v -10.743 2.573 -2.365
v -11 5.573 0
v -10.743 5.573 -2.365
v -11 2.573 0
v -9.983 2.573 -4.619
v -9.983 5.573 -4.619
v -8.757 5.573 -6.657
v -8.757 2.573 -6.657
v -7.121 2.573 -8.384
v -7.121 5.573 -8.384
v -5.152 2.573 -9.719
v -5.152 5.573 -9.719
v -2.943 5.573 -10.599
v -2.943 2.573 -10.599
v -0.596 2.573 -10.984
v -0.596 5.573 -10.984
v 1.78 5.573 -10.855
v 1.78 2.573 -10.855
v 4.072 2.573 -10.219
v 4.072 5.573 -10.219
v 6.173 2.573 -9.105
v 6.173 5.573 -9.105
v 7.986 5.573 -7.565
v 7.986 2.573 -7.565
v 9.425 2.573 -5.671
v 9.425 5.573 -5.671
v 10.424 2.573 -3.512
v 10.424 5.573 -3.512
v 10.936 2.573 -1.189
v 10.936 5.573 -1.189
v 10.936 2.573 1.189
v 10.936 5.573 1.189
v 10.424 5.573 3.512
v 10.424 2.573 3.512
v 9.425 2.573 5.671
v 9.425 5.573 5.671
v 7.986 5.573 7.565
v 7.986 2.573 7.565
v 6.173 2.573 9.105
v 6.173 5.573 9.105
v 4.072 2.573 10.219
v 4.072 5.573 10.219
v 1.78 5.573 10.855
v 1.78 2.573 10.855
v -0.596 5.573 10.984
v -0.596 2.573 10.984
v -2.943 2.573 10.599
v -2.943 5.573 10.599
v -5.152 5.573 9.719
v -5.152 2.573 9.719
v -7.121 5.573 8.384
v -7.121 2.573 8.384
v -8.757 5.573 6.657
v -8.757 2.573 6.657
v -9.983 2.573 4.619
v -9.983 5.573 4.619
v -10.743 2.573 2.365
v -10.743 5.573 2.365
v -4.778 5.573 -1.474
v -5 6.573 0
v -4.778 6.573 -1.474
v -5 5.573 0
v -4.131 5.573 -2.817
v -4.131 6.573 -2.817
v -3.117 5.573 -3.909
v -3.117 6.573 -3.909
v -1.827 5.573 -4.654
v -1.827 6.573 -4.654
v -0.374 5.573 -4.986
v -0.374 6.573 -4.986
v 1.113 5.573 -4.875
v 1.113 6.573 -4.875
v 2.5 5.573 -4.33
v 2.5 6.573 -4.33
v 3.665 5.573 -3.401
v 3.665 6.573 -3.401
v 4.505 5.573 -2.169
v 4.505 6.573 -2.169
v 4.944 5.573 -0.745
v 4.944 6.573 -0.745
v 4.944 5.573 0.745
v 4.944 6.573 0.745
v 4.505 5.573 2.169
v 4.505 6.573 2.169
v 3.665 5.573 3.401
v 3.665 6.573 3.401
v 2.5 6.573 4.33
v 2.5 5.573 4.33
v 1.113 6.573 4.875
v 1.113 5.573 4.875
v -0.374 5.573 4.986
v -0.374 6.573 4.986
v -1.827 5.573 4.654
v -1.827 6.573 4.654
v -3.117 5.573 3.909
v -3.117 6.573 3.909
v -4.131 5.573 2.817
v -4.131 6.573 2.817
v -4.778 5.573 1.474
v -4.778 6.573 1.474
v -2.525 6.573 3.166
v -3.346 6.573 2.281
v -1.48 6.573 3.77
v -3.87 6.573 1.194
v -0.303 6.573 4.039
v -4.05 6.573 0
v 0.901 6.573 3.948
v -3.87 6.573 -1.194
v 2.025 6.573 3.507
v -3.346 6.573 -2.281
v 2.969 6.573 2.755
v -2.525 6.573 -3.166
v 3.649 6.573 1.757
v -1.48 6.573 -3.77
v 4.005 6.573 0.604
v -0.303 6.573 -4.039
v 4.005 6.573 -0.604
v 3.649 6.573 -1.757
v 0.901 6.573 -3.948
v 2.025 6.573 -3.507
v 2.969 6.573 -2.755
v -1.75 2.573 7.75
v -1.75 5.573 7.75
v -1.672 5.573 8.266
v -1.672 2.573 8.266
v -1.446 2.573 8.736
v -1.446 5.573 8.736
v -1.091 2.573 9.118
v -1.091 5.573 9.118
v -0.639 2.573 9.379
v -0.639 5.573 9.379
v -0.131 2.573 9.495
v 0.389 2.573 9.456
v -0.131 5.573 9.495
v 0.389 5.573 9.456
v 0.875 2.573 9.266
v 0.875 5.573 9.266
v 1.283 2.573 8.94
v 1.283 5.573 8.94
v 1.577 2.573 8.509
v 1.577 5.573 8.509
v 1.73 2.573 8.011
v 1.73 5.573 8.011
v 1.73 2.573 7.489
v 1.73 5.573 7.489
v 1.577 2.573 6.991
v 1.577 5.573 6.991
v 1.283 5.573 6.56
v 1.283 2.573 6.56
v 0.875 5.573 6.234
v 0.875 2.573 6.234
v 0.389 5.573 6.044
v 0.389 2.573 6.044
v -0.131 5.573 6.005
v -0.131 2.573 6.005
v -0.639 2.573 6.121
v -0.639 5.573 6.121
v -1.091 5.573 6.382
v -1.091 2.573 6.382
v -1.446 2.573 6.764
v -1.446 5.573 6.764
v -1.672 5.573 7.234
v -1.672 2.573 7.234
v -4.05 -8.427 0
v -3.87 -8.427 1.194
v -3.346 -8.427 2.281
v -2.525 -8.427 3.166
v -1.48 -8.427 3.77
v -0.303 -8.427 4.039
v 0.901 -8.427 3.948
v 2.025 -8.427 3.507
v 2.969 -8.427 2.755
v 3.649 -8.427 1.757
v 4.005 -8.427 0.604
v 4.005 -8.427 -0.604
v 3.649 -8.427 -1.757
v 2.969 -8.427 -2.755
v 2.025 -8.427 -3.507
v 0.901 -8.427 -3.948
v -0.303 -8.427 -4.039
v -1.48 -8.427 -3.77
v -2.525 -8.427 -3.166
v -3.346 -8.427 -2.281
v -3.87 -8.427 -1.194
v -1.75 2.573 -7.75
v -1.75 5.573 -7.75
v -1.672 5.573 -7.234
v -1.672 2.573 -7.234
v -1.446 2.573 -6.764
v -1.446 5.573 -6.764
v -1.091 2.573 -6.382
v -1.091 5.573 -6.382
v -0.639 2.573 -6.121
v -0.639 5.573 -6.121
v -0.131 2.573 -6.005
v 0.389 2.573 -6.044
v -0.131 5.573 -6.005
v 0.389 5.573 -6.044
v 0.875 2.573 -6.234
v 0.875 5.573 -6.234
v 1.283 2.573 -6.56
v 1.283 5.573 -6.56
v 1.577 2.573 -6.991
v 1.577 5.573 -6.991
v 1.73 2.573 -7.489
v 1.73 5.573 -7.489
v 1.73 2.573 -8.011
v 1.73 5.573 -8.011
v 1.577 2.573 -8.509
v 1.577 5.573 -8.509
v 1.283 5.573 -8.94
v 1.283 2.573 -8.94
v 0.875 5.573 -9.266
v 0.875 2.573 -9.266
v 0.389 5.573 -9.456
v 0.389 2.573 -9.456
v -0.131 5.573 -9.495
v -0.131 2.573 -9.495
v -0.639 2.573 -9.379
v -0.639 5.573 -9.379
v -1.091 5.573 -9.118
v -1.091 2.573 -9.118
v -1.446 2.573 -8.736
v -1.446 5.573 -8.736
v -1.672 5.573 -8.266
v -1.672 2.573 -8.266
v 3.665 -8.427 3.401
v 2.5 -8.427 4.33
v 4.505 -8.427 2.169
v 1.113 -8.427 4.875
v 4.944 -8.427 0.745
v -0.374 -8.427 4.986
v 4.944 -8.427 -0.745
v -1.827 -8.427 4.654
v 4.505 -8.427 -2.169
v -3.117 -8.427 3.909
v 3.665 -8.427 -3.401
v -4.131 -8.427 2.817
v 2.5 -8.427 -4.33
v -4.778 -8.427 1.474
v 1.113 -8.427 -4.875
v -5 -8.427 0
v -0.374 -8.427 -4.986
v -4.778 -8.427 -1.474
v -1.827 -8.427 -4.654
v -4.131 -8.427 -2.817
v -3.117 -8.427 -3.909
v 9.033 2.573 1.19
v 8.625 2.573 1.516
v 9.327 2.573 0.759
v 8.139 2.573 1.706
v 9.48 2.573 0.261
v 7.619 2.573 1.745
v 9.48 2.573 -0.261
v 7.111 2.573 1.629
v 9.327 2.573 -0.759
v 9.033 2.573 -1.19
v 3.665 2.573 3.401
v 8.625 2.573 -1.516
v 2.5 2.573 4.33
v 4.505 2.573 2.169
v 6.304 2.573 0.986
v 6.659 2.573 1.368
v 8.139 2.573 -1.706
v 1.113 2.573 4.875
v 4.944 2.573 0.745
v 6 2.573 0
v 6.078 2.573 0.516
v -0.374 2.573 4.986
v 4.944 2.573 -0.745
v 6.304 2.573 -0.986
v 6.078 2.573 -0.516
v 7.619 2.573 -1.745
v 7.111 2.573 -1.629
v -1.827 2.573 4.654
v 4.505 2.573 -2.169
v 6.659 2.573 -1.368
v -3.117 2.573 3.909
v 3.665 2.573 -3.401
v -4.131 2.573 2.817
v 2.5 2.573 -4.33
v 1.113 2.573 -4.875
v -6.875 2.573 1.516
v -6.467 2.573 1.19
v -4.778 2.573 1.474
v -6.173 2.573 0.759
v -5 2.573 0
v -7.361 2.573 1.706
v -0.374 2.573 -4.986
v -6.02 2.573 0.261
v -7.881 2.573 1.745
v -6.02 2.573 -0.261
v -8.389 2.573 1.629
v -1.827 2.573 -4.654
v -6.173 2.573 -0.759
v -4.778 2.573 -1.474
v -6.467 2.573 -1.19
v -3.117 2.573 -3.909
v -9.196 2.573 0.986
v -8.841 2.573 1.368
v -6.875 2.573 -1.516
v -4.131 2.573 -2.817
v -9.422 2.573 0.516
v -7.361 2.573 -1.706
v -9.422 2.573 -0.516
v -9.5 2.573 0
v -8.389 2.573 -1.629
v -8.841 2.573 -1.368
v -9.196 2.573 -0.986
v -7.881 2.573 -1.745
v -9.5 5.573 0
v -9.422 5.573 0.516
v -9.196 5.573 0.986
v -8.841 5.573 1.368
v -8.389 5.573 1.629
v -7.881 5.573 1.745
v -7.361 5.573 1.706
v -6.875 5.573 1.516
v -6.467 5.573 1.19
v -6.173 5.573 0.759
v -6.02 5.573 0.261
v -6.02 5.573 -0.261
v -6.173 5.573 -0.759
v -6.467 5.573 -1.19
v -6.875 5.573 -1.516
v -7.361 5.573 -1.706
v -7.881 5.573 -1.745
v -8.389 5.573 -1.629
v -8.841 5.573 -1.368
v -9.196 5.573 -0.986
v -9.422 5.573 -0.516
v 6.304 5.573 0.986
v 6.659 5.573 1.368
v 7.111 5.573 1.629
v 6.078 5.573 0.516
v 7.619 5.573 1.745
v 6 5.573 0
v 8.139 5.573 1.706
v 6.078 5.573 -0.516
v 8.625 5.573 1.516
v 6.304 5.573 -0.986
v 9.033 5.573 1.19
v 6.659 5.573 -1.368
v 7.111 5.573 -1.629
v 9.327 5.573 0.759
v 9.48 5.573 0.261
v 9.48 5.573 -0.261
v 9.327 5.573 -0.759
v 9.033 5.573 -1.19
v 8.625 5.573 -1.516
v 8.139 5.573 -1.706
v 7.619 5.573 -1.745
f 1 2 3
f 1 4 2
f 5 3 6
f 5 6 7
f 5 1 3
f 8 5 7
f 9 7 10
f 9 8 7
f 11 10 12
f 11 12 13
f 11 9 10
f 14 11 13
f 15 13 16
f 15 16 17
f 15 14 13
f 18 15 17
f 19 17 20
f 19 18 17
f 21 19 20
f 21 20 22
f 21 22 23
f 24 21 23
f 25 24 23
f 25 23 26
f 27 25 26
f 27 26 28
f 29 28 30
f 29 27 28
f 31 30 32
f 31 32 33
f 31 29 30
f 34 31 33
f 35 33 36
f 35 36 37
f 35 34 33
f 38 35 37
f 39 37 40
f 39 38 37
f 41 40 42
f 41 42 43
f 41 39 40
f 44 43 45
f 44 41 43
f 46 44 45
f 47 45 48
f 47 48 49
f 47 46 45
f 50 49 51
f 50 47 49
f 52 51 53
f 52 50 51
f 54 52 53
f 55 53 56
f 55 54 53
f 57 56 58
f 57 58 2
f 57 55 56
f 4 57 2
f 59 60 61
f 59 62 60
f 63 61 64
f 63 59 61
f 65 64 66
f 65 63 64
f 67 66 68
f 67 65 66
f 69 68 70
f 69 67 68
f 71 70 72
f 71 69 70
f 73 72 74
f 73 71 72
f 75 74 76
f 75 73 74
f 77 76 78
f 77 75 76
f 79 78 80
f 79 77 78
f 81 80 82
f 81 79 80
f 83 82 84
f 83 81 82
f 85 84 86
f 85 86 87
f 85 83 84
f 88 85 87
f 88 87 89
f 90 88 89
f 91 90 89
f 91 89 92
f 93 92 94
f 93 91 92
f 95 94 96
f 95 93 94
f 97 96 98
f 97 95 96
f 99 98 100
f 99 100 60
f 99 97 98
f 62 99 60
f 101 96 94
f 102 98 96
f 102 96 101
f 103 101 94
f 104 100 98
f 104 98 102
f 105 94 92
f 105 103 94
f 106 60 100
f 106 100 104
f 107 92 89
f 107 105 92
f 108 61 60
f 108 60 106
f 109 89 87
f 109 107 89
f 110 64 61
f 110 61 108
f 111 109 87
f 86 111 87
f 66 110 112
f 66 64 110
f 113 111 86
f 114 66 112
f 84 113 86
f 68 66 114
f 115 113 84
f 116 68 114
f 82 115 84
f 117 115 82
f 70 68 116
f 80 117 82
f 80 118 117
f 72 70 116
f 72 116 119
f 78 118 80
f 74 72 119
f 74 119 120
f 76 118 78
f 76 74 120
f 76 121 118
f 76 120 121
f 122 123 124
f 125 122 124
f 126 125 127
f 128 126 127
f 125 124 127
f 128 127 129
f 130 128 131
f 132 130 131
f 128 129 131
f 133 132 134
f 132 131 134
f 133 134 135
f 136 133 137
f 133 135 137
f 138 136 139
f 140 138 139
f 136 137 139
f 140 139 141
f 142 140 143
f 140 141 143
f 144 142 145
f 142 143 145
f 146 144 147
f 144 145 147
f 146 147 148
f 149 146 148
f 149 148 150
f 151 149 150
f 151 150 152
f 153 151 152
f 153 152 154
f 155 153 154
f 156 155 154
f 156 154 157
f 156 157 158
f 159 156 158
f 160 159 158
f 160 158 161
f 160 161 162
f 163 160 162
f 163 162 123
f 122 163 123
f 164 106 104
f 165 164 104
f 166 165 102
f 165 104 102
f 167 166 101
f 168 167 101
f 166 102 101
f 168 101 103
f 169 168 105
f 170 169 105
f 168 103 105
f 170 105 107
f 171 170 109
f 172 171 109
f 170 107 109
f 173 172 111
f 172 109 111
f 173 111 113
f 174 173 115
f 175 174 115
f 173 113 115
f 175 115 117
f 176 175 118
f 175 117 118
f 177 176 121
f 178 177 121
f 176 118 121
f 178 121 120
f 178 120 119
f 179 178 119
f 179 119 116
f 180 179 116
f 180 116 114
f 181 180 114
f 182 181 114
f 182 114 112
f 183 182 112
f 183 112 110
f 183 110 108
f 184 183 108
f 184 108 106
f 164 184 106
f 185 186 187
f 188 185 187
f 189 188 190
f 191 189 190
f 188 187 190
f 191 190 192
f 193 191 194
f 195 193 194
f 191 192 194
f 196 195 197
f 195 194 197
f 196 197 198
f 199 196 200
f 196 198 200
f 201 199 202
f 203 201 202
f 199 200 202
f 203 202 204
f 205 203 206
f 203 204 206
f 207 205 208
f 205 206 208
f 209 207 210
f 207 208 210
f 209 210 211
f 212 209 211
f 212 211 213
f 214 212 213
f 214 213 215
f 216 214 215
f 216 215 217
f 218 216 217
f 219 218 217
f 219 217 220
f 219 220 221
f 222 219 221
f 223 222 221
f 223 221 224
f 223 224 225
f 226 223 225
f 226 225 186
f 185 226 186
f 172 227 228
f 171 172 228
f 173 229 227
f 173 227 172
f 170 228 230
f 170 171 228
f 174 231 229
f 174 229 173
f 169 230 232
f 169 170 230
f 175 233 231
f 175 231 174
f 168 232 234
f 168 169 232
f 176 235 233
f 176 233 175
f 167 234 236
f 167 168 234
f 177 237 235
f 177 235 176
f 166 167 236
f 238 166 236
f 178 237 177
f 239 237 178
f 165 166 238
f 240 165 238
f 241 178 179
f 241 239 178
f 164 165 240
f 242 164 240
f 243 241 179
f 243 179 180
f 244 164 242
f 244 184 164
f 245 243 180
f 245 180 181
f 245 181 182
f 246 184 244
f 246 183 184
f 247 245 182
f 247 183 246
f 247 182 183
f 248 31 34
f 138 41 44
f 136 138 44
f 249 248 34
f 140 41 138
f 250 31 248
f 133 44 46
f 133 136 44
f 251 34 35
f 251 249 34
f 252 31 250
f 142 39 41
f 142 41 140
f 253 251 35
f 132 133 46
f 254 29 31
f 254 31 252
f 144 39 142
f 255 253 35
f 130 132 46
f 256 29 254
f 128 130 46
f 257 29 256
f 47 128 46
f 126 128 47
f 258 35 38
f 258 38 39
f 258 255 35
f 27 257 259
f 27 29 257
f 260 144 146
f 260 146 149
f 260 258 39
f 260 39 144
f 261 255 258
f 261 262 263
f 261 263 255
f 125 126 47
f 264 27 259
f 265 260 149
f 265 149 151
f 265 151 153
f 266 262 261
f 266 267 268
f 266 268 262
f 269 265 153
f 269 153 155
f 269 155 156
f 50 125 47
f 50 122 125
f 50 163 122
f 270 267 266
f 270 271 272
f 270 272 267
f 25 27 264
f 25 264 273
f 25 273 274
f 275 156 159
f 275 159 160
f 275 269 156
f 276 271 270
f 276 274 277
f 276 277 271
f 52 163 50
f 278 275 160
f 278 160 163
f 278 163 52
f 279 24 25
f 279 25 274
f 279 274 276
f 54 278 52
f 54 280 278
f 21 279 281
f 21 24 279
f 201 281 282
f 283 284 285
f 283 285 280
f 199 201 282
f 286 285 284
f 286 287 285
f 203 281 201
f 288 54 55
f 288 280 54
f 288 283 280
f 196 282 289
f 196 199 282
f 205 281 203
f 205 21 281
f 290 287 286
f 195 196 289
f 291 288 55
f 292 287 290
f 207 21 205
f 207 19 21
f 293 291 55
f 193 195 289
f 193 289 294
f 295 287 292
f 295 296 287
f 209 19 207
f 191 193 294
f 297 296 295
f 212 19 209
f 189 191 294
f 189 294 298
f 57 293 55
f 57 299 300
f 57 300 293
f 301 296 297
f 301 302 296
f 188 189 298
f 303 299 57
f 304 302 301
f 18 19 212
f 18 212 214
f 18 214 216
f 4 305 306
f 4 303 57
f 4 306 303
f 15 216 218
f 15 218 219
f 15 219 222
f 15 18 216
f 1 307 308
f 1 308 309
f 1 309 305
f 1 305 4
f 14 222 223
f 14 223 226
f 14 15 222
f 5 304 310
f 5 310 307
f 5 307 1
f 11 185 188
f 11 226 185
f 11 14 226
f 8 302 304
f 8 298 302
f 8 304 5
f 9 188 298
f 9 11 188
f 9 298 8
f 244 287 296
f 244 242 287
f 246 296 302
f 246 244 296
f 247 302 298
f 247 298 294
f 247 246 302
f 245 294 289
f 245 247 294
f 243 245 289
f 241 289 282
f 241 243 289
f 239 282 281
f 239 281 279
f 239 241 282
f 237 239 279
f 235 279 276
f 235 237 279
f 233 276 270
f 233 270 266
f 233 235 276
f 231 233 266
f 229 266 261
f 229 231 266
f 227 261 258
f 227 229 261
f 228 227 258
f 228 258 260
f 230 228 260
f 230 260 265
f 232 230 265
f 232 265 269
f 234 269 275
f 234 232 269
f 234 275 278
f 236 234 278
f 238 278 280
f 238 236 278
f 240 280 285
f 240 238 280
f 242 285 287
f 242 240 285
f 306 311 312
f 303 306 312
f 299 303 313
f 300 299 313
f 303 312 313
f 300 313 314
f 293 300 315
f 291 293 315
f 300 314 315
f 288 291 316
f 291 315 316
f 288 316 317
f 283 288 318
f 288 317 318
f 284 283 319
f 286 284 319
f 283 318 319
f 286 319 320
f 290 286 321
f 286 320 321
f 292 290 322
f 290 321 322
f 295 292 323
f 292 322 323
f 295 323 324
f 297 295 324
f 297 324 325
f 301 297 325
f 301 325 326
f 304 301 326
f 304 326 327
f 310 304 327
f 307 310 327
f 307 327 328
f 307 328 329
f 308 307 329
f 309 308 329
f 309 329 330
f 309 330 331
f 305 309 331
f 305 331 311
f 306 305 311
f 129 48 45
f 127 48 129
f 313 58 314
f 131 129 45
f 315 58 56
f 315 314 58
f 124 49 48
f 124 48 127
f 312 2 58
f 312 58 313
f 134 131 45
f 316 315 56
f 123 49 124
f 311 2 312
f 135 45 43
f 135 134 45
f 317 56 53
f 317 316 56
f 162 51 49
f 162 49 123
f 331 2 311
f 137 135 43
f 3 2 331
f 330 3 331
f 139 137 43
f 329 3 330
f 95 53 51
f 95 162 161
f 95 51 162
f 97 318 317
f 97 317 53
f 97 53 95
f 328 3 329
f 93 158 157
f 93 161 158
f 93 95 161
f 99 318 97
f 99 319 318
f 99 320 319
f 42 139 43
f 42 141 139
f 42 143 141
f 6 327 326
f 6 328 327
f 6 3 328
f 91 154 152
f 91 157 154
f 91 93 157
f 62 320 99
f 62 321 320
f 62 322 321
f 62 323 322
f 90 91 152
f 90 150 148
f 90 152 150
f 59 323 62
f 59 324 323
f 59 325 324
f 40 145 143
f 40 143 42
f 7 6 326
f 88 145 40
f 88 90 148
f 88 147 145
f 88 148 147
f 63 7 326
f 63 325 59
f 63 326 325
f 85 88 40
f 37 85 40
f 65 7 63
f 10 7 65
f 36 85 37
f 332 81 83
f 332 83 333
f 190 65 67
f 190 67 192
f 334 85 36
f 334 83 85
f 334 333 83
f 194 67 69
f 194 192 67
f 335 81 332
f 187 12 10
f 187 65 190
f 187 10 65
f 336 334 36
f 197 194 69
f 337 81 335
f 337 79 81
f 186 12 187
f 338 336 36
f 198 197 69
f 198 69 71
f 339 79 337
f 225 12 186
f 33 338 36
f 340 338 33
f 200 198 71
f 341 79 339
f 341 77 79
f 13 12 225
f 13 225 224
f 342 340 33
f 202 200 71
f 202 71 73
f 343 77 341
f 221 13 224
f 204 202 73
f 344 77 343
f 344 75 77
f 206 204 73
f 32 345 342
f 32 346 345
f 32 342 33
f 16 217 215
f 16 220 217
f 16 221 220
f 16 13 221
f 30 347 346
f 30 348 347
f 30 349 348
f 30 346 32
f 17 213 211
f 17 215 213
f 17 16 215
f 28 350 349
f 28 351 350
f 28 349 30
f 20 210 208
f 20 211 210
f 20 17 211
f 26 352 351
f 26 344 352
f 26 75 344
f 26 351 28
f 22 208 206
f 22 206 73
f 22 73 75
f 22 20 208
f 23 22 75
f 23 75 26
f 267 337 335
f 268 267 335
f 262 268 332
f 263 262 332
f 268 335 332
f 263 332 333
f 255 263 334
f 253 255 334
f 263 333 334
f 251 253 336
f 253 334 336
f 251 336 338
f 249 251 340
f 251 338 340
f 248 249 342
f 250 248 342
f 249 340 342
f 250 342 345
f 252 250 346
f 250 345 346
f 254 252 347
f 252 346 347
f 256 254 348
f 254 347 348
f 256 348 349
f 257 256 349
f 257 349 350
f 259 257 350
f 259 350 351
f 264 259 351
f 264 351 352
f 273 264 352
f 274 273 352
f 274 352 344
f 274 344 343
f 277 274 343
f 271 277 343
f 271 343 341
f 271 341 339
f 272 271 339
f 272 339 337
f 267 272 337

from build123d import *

# Parameters (mm, degrees)
KES_EKSTR_ZYON1_REACH = 23.61
IZIM2_R               = 4.05
KES_EKSTR_ZYON2_REACH = 22.928
IZIM3_R               = 1.75


with BuildPart() as part:
    # Çizim1 → Döndür1 (revolve)
    with BuildSketch(Plane.XY, mode=Mode.PRIVATE) as d_nd_r1_sk:
        Polygon((0, 6.572949203), (5, 6.572949203), (5, 5.572949203), (11, 5.572949203), (11, 2.572949203), (5, 2.572949203), (5, -8.427050797), (0, -8.427050797), align=None)
    revolve(d_nd_r1_sk.sketch.rotate(Axis((0, 6.572949203, 0), (0, -1, 0)), 180), axis=Axis((0, 6.572949203, 0), (0, -1, 0)))

    # Çizim2 → Kes-Ekstrüzyon1 (cut, up to next)
    with BuildSketch(Plane(origin=(0, 6.572949203, 0), x_dir=(1, 0, 0), z_dir=(0, 1, 0)), mode=Mode.PRIVATE) as kes_ekstr_zyon1_sk1:
        with Locations(Location((0, 0, 0), (0, 0, 180))):
            Circle(IZIM2_R)
    kes_ekstr_zyon1_tool1 = extrude(kes_ekstr_zyon1_sk1.sketch, amount=-KES_EKSTR_ZYON1_REACH, mode=Mode.PRIVATE) & part.part
    add(kes_ekstr_zyon1_tool1.solids().sort_by_distance((0, 6.572949, 0))[0], mode=Mode.SUBTRACT)

    # Çizim3 → Kes-Ekstrüzyon2 (cut, up to next)
    with BuildSketch(Plane(origin=(0, 5.572949203, 0), x_dir=(1, 0, 0), z_dir=(0, 1, 0)), mode=Mode.PRIVATE) as kes_ekstr_zyon2_sk1:
        with Locations(Location((0, 7.75, 0), (0, 0, 180))):
            Circle(IZIM3_R)
    kes_ekstr_zyon2_tool1 = extrude(kes_ekstr_zyon2_sk1.sketch, amount=-KES_EKSTR_ZYON2_REACH, mode=Mode.PRIVATE) & part.part
    # Çizim3 → Kes-Ekstrüzyon2 (cut, up to next)
    with BuildSketch(Plane(origin=(0, 5.572949203, 0), x_dir=(1, 0, 0), z_dir=(0, 1, 0)), mode=Mode.PRIVATE) as kes_ekstr_zyon2_sk2:
        with Locations(Location((7.75, 0, 0), (0, 0, 180))):
            Circle(IZIM3_R)
    kes_ekstr_zyon2_tool2 = extrude(kes_ekstr_zyon2_sk2.sketch, amount=-KES_EKSTR_ZYON2_REACH, mode=Mode.PRIVATE) & part.part
    # Çizim3 → Kes-Ekstrüzyon2 (cut, up to next)
    with BuildSketch(Plane(origin=(0, 5.572949203, 0), x_dir=(1, 0, 0), z_dir=(0, 1, 0)), mode=Mode.PRIVATE) as kes_ekstr_zyon2_sk3:
        with Locations(Location((0, -7.75, 0), (0, 0, 180))):
            Circle(IZIM3_R)
    kes_ekstr_zyon2_tool3 = extrude(kes_ekstr_zyon2_sk3.sketch, amount=-KES_EKSTR_ZYON2_REACH, mode=Mode.PRIVATE) & part.part
    # Çizim3 → Kes-Ekstrüzyon2 (cut, up to next)
    with BuildSketch(Plane(origin=(0, 5.572949203, 0), x_dir=(1, 0, 0), z_dir=(0, 1, 0)), mode=Mode.PRIVATE) as kes_ekstr_zyon2_sk4:
        with Locations(Location((-7.75, 0, 0), (0, 0, 180))):
            Circle(IZIM3_R)
    kes_ekstr_zyon2_tool4 = extrude(kes_ekstr_zyon2_sk4.sketch, amount=-KES_EKSTR_ZYON2_REACH, mode=Mode.PRIVATE) & part.part
    add(kes_ekstr_zyon2_tool1.solids().sort_by_distance((0, 5.572949, -7.75))[0], mode=Mode.SUBTRACT)
    add(kes_ekstr_zyon2_tool2.solids().sort_by_distance((7.75, 5.572949, 0))[0], mode=Mode.SUBTRACT)
    add(kes_ekstr_zyon2_tool3.solids().sort_by_distance((0, 5.572949, 7.75))[0], mode=Mode.SUBTRACT)
    add(kes_ekstr_zyon2_tool4.solids().sort_by_distance((-7.75, 5.572949, 0))[0], mode=Mode.SUBTRACT)


solid = part.part
